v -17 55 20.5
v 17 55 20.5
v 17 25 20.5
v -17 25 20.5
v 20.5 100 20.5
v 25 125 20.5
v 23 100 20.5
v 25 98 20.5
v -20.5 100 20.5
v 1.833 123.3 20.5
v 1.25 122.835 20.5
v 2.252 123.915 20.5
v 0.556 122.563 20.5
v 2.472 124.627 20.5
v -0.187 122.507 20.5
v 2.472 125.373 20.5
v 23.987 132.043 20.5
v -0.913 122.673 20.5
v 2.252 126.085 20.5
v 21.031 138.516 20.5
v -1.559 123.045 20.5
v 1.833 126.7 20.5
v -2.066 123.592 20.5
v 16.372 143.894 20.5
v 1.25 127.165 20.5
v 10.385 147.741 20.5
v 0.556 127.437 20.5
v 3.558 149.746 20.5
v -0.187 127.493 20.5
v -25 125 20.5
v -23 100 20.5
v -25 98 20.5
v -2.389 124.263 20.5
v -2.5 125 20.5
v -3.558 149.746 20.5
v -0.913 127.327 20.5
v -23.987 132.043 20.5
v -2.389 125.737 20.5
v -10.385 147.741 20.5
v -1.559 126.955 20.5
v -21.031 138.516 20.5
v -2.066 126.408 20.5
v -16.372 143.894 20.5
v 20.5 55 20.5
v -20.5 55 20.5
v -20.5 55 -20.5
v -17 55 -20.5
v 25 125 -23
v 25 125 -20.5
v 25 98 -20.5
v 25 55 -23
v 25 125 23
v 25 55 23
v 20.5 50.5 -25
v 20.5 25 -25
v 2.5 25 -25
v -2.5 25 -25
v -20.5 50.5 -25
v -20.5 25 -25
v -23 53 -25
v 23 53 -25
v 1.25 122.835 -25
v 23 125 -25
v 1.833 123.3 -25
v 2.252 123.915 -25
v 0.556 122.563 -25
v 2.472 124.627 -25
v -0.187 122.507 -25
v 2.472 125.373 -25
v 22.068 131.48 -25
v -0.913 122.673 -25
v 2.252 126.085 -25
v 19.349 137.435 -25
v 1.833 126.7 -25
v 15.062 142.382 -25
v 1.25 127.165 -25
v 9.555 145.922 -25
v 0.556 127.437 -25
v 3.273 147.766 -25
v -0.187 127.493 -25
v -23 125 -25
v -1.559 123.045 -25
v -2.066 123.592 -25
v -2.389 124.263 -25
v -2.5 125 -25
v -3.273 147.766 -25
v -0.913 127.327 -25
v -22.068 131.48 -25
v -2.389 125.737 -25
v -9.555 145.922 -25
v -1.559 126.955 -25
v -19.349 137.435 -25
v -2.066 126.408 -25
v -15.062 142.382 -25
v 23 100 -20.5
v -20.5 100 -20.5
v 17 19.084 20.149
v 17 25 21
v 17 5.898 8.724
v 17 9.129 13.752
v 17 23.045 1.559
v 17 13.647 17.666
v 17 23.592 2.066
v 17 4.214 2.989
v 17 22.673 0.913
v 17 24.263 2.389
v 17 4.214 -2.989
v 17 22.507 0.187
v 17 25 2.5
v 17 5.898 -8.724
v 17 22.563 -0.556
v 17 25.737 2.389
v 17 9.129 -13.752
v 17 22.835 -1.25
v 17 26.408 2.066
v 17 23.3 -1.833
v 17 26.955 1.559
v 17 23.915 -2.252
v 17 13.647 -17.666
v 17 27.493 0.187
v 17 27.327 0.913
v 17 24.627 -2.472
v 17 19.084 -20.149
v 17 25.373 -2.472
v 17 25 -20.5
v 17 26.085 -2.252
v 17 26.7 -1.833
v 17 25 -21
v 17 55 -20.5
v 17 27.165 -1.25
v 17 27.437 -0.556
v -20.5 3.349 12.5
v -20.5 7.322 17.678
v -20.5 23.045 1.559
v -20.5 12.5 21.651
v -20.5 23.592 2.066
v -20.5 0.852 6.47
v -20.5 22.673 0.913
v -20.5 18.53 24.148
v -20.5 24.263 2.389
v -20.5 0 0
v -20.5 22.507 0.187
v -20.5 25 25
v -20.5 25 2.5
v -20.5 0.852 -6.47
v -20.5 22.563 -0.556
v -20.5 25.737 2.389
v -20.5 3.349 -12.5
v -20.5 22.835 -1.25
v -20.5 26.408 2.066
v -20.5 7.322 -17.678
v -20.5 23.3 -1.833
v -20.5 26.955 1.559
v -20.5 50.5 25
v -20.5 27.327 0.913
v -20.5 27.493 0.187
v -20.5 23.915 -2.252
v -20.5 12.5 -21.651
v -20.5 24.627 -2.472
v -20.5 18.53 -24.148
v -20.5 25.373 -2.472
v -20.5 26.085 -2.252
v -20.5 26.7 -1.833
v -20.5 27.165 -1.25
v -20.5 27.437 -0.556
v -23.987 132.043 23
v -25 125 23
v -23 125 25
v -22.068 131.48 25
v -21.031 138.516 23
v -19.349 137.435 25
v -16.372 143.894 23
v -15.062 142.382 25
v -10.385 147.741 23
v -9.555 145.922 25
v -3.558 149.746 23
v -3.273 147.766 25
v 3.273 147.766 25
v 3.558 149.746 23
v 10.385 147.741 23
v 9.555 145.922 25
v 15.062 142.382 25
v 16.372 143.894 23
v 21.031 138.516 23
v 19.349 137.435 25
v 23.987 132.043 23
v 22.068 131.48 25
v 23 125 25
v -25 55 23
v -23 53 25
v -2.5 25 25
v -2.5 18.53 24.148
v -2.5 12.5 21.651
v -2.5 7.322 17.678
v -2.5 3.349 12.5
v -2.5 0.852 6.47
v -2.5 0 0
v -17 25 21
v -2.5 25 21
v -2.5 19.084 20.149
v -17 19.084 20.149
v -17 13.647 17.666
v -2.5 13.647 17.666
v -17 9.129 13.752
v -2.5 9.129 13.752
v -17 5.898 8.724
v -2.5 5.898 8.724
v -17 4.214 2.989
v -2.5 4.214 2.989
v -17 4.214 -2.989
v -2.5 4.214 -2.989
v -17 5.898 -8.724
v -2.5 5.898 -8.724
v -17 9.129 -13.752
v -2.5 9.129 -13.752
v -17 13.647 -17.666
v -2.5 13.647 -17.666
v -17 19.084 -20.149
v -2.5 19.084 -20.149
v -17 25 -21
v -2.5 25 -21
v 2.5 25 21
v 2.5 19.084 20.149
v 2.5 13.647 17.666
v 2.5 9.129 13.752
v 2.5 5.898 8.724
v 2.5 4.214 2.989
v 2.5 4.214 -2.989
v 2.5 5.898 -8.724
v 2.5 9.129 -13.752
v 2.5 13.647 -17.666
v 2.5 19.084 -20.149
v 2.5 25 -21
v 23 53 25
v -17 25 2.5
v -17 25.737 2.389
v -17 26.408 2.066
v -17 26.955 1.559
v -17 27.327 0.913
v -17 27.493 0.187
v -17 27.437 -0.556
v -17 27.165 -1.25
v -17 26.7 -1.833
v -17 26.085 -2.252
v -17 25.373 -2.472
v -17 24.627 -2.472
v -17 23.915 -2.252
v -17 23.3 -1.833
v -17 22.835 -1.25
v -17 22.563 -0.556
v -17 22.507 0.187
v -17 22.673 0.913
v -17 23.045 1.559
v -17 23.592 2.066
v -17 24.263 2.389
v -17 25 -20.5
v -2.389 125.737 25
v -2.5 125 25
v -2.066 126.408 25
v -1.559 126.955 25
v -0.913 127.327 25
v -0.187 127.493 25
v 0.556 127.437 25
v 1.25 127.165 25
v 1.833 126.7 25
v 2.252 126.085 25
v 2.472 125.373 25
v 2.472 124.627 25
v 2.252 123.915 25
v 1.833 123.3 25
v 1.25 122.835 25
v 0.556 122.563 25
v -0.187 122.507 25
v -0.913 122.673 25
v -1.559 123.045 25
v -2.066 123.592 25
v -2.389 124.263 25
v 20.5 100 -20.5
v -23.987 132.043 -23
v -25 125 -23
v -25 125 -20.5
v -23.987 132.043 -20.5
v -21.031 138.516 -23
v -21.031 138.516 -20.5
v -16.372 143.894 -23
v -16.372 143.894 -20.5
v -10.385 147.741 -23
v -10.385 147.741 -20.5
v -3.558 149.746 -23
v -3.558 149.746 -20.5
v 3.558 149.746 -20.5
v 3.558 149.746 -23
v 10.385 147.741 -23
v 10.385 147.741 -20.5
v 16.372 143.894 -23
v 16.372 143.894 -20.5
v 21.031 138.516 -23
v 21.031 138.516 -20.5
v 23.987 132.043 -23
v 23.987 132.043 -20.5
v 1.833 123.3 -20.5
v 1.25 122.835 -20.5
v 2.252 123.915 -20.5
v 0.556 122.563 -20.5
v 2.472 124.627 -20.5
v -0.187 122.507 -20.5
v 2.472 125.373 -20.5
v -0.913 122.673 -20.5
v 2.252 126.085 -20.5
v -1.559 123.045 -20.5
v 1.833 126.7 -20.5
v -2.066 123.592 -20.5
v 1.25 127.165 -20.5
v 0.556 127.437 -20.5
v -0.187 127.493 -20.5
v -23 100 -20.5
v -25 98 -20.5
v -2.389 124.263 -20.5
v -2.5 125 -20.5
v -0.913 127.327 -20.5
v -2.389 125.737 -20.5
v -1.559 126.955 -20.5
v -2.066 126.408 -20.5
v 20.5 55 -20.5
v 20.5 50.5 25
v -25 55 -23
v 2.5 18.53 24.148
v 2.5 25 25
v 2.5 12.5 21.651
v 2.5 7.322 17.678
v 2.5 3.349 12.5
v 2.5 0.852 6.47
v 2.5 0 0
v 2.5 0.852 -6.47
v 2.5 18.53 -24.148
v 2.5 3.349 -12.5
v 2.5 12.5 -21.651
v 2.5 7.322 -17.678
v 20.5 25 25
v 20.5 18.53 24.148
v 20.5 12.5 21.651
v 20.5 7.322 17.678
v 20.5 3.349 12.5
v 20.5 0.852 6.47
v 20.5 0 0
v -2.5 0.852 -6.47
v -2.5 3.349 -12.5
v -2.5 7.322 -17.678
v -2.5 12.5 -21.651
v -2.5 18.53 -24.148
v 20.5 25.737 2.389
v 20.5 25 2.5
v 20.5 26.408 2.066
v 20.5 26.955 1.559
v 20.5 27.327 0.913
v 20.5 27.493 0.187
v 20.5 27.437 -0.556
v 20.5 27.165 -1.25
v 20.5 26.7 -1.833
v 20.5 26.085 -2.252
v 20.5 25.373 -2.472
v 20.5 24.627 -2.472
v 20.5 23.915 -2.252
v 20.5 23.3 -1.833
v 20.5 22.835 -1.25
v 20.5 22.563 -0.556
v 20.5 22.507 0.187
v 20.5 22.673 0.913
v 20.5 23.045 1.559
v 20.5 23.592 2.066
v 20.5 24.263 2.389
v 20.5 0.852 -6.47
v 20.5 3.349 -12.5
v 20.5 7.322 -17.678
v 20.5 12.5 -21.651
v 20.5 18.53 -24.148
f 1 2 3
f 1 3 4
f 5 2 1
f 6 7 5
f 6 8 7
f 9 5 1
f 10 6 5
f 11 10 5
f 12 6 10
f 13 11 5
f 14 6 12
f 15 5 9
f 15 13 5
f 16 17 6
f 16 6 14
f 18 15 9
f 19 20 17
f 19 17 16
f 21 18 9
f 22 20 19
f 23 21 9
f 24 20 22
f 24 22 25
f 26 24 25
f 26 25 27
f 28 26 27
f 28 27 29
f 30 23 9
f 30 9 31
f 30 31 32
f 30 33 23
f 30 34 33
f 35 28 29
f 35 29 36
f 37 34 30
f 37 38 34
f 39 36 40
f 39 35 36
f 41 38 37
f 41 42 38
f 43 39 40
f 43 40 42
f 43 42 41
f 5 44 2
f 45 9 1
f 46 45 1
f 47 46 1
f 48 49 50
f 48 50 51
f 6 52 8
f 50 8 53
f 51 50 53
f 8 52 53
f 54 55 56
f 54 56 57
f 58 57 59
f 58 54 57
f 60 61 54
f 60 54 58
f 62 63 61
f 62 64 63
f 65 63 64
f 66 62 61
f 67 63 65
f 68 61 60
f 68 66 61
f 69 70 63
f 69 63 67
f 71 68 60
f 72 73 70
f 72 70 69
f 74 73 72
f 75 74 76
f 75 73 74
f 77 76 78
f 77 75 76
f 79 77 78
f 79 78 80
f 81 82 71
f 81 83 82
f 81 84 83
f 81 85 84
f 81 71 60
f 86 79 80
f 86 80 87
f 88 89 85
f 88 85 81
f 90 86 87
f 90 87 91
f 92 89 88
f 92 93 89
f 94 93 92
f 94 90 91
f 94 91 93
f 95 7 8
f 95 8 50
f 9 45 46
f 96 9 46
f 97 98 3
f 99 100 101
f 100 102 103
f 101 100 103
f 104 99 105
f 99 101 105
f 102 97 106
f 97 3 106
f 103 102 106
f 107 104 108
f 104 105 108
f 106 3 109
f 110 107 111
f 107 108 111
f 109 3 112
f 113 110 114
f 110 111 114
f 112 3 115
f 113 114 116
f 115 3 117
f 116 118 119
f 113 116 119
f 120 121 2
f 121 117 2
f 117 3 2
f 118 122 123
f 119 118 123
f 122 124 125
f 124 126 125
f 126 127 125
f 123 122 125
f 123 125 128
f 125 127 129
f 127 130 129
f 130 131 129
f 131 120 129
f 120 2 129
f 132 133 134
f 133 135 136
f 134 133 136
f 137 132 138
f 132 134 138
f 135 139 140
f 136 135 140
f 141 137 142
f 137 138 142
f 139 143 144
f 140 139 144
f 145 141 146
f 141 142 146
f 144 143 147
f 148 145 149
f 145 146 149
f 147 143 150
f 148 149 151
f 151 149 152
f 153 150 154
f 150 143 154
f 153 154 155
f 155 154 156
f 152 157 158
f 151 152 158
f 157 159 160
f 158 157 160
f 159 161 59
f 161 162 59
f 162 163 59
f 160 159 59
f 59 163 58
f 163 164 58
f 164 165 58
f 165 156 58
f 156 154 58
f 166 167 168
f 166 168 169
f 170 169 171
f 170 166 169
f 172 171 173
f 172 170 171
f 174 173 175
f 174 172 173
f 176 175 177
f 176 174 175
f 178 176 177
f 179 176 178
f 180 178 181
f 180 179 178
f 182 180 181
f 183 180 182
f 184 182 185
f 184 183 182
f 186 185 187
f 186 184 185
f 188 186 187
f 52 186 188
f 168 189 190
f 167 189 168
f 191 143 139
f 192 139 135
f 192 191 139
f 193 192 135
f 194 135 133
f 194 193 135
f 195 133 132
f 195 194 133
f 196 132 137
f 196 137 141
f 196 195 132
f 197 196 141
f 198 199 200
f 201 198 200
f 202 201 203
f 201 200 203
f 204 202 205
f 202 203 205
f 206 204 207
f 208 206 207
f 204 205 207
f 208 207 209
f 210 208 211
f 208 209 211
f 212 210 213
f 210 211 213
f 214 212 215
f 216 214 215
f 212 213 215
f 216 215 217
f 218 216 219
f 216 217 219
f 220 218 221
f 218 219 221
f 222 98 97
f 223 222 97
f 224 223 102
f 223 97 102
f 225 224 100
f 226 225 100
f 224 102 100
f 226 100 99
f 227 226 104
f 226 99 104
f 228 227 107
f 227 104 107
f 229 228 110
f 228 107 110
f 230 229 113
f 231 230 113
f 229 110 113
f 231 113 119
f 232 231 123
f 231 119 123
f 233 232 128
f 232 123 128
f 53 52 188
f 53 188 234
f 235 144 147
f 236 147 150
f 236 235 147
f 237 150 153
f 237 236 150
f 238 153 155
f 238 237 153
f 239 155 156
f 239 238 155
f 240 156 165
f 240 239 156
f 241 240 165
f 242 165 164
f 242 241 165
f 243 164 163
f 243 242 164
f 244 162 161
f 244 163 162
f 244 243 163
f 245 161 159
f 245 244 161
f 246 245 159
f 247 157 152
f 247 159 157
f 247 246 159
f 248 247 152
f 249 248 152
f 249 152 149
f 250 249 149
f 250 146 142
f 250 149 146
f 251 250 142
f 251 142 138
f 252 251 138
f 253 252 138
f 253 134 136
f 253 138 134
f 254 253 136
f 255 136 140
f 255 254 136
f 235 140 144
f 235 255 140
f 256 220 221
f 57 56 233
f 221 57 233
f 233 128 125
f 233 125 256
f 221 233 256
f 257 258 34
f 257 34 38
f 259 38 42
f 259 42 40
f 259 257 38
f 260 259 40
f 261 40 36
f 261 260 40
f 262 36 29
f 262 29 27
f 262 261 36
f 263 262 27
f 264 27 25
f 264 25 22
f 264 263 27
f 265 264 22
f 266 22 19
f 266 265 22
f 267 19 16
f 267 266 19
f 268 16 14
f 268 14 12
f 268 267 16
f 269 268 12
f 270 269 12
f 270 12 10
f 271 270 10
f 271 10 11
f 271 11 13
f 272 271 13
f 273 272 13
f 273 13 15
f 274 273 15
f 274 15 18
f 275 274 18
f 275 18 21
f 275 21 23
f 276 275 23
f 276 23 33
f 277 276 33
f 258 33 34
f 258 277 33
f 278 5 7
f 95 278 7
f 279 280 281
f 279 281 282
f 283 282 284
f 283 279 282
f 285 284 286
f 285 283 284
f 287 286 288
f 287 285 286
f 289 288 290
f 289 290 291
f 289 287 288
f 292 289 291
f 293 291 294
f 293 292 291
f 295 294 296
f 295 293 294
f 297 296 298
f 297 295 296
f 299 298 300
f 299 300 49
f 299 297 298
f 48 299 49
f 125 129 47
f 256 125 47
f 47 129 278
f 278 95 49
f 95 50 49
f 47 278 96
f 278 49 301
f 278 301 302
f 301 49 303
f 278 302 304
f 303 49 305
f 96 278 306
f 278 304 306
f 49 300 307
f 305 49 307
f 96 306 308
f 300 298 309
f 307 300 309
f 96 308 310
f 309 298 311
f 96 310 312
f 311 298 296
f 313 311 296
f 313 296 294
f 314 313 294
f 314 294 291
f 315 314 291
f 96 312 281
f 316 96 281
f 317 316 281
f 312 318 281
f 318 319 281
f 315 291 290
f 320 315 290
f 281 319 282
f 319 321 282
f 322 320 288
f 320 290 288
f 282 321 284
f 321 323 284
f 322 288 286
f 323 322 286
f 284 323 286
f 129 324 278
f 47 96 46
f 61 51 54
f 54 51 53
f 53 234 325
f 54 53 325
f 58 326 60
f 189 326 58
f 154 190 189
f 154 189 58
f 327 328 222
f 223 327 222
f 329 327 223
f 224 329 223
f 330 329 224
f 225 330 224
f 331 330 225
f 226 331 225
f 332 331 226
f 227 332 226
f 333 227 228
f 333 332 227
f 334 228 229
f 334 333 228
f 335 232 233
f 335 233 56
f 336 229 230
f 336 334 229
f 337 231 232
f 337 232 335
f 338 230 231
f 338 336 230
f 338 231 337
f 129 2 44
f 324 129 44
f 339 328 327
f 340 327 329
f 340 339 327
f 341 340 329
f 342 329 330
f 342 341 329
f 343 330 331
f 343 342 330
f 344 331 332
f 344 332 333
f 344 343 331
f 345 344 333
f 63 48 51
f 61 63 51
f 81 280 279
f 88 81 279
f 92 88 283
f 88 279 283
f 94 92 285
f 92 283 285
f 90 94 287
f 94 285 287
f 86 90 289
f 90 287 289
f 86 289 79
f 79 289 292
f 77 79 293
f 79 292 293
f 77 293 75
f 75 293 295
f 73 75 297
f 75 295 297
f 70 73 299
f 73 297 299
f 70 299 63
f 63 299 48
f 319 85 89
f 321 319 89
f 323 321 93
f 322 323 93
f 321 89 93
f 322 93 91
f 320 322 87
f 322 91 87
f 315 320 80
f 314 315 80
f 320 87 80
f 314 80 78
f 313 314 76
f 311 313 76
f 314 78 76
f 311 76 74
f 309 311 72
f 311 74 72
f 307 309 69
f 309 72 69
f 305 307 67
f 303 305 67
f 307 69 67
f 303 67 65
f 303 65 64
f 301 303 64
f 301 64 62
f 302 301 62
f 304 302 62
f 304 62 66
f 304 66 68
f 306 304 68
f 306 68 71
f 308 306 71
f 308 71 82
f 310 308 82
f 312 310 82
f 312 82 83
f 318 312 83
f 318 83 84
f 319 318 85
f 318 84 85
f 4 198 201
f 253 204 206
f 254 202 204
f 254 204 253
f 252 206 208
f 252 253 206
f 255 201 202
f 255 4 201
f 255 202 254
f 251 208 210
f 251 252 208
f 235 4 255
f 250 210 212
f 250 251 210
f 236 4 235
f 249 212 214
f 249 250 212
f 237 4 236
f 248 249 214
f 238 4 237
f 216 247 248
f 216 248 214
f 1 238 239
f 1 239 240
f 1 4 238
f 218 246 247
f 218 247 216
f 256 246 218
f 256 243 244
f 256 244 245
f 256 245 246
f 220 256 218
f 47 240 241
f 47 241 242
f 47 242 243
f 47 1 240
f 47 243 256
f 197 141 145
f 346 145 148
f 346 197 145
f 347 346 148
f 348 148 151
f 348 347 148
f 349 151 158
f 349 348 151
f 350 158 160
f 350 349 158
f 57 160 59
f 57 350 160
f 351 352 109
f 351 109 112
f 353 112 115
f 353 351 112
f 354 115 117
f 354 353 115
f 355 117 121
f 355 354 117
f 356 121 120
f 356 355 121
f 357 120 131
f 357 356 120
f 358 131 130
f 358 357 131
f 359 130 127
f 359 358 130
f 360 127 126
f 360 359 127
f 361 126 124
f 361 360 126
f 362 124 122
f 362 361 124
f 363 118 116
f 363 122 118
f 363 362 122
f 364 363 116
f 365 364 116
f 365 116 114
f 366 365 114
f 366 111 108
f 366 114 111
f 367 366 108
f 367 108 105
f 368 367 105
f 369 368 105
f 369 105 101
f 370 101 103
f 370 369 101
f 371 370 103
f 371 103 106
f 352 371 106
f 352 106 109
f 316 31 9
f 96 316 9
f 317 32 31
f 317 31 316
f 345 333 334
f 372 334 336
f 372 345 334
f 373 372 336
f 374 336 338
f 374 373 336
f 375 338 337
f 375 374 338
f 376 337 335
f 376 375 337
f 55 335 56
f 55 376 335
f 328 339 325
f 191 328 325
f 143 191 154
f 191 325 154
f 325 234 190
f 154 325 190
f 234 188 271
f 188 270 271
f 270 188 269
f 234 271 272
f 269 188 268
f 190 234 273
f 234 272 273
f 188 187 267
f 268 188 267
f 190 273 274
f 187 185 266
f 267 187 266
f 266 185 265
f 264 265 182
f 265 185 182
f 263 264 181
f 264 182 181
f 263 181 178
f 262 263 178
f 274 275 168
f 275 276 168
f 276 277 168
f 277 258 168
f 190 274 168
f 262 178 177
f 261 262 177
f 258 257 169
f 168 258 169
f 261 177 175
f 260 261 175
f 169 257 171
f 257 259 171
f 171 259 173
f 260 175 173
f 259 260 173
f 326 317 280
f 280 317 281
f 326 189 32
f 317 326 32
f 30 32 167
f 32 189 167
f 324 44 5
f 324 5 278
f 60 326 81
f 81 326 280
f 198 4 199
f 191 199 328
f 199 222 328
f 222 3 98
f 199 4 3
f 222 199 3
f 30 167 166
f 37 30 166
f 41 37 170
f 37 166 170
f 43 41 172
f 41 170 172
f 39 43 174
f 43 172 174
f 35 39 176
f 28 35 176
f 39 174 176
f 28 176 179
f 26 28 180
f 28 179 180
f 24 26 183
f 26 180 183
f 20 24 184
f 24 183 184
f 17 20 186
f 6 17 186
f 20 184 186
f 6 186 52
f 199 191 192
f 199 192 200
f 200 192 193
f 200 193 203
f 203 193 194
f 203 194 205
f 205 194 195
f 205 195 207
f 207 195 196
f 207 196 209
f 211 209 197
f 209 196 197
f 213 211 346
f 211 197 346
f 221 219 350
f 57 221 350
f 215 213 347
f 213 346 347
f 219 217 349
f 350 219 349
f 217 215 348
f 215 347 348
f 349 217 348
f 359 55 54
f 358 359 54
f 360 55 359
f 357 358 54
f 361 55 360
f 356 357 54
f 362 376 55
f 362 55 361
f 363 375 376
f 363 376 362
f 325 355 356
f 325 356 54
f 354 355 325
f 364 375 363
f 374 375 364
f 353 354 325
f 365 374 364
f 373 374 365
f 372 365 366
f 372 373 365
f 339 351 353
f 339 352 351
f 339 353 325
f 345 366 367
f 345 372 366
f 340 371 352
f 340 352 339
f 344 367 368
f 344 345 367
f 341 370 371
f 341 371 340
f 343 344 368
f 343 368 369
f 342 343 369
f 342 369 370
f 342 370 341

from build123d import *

# Parameters (mm, degrees)
SKETCH1_W               = 50
SKETCH1_H               = 50
BOSS_EXTRUDE1_DEPTH     = 100
SKETCH4_R               = 2.5
BOSS_EXTRUDE2_DEPTH     = 4.5
CUT_EXTRUDE1_DEPTH      = 161.078105936
CUT_EXTRUDE1_DEPTH_BACK = 161.078105936
SKETCH5_R               = 2.5
SKETCH6_W               = 50
SKETCH6_H               = 50
CUT_EXTRUDE2_DEPTH      = 4.5
CHAMFER1_SIZE           = 2
CHAMFER2_SIZE           = 5
SKETCH7_W               = 41
SKETCH7_H               = 41
CUT_EXTRUDE3_DEPTH      = 45
SKETCH8_W               = 34
SKETCH8_H               = 41
CUT_EXTRUDE4_DEPTH      = 30
CUT_EXTRUDE5_DEPTH      = 34
SKETCH10_W              = 5
SKETCH10_H              = 50.266184812
CUT_EXTRUDE6_DEPTH      = 25


with BuildPart() as part:
    # Sketch1 → Boss-Extrude1 (new body)
    with BuildSketch(Plane(origin=(0, 0, 0), x_dir=(1, 0, 0), z_dir=(0, 1, 0))):
        Rectangle(SKETCH1_W, SKETCH1_H)
    extrude(amount=BOSS_EXTRUDE1_DEPTH)

    # Sketch4 → Boss-Extrude2 (add)
    with BuildSketch(Plane(origin=(0, 0, -25), x_dir=(-1, 0, 0), z_dir=(0, 0, -1))):
        with BuildLine():
            Line((-25, 100), (25, 100))
            Line((25, 100), (25, 125))
            ThreePointArc((25, 125), (0, 150), (-25, 125))
            Line((-25, 125), (-25, 100))
        make_face()
        with Locations((0, 125)):
            Circle(SKETCH4_R, mode=Mode.SUBTRACT)
    boss_extrude2 = extrude(amount=-BOSS_EXTRUDE2_DEPTH)

    # Mirror2: Boss-Extrude2 across plane
    add(boss_extrude2.mirror(Plane.XY))

    # Sketch5 → Cut-Extrude1 (cut, two sides: drawn at the far end of the back side and taken through both)
    with BuildSketch(Plane.ZY.offset(-25).offset(-CUT_EXTRUDE1_DEPTH_BACK)):
        with BuildLine():
            Line((-25, 0), (2.6e-08, 0))
            ThreePointArc((2.6e-08, 0), (-17.67766952, 7.322330461), (-25, 25))
            Line((-25, 25), (-25, 0))
        make_face()
        with BuildLine():
            Line((25, 0), (25, 25))
            ThreePointArc((25, 25), (17.677669539, 7.32233048), (2.6e-08, 0))
            Line((2.6e-08, 0), (25, 0))
        make_face()
        with Locations((0, 25)):
            Circle(SKETCH5_R)
    extrude(amount=CUT_EXTRUDE1_DEPTH + CUT_EXTRUDE1_DEPTH_BACK, mode=Mode.SUBTRACT)

    # Sketch6 → Cut-Extrude2 (cut)
    with BuildSketch(Plane(origin=(25, 0, 0), x_dir=(0, 0, -1), z_dir=(1, 0, 0))):
        with Locations((0, 25)):
            Rectangle(SKETCH6_W, SKETCH6_H)
    cut_extrude2 = extrude(amount=-CUT_EXTRUDE2_DEPTH, mode=Mode.SUBTRACT)

    # Mirror3: Cut-Extrude2 across plane
    add(cut_extrude2.mirror(Plane(origin=(0, 0, 0), x_dir=(0, 0, 1), z_dir=(1, 0, 0))), mode=Mode.SUBTRACT)

    # Chamfer1
    chamfer1_edges = [part.edges().sort_by_distance(p)[0] for p in [
        (-25, 100, 0),
        (0, 150, -25),
        (25, 100, 0),
        (0, 150, 25),
        (25, 87.5, 25),
        (-25, 87.5, 25),
        (-25, 87.5, -25),
        (25, 87.5, -25),
    ]]
    chamfer(chamfer1_edges, length=CHAMFER1_SIZE)

    # Chamfer2
    # the kernel refuses this chamfer: 5 mm, written as the material it takes off along each edge
    with BuildSketch(Plane(origin=(25, 50, 35.85841494), x_dir=(0.027495876610586317, 0.9996219169112968, 0), z_dir=(0, 0, -1))) as chamfer2_piece_1_section:
        Polygon((CHAMFER2_SIZE * 0.999621916911, -CHAMFER2_SIZE * 0.0274958766106), (-CHAMFER2_SIZE * 0.0274958766106, -CHAMFER2_SIZE * 0.999621916911), (0, 0), align=None)
    chamfer2_piece_1 = extrude(amount=71.71682988, mode=Mode.PRIVATE)
    chamfer2_piece_1 = split(chamfer2_piece_1, bisect_by=Plane(origin=(20.5, 51.679503735, 0), z_dir=(1, 0, 0)), keep=Keep.TOP, mode=Mode.PRIVATE)
    add(chamfer2_piece_1, mode=Mode.SUBTRACT)
    with BuildSketch(Plane(origin=(-25, 50, 35.85841494), x_dir=(-0.027495876610586317, 0.9996219169112968, 0), z_dir=(0, 0, -1))) as chamfer2_piece_2_section:
        Polygon((CHAMFER2_SIZE * 0.999621916911, CHAMFER2_SIZE * 0.0274958766106), (-CHAMFER2_SIZE * 0.0274958766106, CHAMFER2_SIZE * 0.999621916911), (0, 0), align=None)
    chamfer2_piece_2 = extrude(amount=71.71682988, mode=Mode.PRIVATE)
    chamfer2_piece_2 = split(chamfer2_piece_2, bisect_by=Plane(origin=(-20.5, 51.679503735, 0), z_dir=(-1, 0, 0)), keep=Keep.TOP, mode=Mode.PRIVATE)
    add(chamfer2_piece_2, mode=Mode.SUBTRACT)

    # Sketch7 → Cut-Extrude3 (cut)
    with BuildSketch(Plane(origin=(0, 100, 0), x_dir=(1, 0, 0), z_dir=(0, 1, 0))):
        Rectangle(SKETCH7_W, SKETCH7_H)
    extrude(amount=-CUT_EXTRUDE3_DEPTH, mode=Mode.SUBTRACT)

    # Sketch8 → Cut-Extrude4 (cut)
    with BuildSketch(Plane(origin=(0, 55, 0), x_dir=(1, 0, 0), z_dir=(0, 1, 0))):
        Rectangle(SKETCH8_W, SKETCH8_H)
    extrude(amount=-CUT_EXTRUDE4_DEPTH, mode=Mode.SUBTRACT)

    # Sketch9 → Cut-Extrude5 (cut)
    with BuildSketch(Plane.ZY.offset(-17)):
        with BuildLine():
            Line((-21, 25), (21, 25))
            ThreePointArc((21, 25), (0, 4), (-21, 25))
        make_face()
    extrude(amount=CUT_EXTRUDE5_DEPTH, mode=Mode.SUBTRACT)

    # Sketch10 → Cut-Extrude6 (cut)
    with BuildSketch(Plane(origin=(0, 0, 0), x_dir=(1, 0, 0), z_dir=(0, 1, 0))):
        Rectangle(SKETCH10_W, SKETCH10_H)
    extrude(amount=CUT_EXTRUDE6_DEPTH, mode=Mode.SUBTRACT)


solid = part.part
